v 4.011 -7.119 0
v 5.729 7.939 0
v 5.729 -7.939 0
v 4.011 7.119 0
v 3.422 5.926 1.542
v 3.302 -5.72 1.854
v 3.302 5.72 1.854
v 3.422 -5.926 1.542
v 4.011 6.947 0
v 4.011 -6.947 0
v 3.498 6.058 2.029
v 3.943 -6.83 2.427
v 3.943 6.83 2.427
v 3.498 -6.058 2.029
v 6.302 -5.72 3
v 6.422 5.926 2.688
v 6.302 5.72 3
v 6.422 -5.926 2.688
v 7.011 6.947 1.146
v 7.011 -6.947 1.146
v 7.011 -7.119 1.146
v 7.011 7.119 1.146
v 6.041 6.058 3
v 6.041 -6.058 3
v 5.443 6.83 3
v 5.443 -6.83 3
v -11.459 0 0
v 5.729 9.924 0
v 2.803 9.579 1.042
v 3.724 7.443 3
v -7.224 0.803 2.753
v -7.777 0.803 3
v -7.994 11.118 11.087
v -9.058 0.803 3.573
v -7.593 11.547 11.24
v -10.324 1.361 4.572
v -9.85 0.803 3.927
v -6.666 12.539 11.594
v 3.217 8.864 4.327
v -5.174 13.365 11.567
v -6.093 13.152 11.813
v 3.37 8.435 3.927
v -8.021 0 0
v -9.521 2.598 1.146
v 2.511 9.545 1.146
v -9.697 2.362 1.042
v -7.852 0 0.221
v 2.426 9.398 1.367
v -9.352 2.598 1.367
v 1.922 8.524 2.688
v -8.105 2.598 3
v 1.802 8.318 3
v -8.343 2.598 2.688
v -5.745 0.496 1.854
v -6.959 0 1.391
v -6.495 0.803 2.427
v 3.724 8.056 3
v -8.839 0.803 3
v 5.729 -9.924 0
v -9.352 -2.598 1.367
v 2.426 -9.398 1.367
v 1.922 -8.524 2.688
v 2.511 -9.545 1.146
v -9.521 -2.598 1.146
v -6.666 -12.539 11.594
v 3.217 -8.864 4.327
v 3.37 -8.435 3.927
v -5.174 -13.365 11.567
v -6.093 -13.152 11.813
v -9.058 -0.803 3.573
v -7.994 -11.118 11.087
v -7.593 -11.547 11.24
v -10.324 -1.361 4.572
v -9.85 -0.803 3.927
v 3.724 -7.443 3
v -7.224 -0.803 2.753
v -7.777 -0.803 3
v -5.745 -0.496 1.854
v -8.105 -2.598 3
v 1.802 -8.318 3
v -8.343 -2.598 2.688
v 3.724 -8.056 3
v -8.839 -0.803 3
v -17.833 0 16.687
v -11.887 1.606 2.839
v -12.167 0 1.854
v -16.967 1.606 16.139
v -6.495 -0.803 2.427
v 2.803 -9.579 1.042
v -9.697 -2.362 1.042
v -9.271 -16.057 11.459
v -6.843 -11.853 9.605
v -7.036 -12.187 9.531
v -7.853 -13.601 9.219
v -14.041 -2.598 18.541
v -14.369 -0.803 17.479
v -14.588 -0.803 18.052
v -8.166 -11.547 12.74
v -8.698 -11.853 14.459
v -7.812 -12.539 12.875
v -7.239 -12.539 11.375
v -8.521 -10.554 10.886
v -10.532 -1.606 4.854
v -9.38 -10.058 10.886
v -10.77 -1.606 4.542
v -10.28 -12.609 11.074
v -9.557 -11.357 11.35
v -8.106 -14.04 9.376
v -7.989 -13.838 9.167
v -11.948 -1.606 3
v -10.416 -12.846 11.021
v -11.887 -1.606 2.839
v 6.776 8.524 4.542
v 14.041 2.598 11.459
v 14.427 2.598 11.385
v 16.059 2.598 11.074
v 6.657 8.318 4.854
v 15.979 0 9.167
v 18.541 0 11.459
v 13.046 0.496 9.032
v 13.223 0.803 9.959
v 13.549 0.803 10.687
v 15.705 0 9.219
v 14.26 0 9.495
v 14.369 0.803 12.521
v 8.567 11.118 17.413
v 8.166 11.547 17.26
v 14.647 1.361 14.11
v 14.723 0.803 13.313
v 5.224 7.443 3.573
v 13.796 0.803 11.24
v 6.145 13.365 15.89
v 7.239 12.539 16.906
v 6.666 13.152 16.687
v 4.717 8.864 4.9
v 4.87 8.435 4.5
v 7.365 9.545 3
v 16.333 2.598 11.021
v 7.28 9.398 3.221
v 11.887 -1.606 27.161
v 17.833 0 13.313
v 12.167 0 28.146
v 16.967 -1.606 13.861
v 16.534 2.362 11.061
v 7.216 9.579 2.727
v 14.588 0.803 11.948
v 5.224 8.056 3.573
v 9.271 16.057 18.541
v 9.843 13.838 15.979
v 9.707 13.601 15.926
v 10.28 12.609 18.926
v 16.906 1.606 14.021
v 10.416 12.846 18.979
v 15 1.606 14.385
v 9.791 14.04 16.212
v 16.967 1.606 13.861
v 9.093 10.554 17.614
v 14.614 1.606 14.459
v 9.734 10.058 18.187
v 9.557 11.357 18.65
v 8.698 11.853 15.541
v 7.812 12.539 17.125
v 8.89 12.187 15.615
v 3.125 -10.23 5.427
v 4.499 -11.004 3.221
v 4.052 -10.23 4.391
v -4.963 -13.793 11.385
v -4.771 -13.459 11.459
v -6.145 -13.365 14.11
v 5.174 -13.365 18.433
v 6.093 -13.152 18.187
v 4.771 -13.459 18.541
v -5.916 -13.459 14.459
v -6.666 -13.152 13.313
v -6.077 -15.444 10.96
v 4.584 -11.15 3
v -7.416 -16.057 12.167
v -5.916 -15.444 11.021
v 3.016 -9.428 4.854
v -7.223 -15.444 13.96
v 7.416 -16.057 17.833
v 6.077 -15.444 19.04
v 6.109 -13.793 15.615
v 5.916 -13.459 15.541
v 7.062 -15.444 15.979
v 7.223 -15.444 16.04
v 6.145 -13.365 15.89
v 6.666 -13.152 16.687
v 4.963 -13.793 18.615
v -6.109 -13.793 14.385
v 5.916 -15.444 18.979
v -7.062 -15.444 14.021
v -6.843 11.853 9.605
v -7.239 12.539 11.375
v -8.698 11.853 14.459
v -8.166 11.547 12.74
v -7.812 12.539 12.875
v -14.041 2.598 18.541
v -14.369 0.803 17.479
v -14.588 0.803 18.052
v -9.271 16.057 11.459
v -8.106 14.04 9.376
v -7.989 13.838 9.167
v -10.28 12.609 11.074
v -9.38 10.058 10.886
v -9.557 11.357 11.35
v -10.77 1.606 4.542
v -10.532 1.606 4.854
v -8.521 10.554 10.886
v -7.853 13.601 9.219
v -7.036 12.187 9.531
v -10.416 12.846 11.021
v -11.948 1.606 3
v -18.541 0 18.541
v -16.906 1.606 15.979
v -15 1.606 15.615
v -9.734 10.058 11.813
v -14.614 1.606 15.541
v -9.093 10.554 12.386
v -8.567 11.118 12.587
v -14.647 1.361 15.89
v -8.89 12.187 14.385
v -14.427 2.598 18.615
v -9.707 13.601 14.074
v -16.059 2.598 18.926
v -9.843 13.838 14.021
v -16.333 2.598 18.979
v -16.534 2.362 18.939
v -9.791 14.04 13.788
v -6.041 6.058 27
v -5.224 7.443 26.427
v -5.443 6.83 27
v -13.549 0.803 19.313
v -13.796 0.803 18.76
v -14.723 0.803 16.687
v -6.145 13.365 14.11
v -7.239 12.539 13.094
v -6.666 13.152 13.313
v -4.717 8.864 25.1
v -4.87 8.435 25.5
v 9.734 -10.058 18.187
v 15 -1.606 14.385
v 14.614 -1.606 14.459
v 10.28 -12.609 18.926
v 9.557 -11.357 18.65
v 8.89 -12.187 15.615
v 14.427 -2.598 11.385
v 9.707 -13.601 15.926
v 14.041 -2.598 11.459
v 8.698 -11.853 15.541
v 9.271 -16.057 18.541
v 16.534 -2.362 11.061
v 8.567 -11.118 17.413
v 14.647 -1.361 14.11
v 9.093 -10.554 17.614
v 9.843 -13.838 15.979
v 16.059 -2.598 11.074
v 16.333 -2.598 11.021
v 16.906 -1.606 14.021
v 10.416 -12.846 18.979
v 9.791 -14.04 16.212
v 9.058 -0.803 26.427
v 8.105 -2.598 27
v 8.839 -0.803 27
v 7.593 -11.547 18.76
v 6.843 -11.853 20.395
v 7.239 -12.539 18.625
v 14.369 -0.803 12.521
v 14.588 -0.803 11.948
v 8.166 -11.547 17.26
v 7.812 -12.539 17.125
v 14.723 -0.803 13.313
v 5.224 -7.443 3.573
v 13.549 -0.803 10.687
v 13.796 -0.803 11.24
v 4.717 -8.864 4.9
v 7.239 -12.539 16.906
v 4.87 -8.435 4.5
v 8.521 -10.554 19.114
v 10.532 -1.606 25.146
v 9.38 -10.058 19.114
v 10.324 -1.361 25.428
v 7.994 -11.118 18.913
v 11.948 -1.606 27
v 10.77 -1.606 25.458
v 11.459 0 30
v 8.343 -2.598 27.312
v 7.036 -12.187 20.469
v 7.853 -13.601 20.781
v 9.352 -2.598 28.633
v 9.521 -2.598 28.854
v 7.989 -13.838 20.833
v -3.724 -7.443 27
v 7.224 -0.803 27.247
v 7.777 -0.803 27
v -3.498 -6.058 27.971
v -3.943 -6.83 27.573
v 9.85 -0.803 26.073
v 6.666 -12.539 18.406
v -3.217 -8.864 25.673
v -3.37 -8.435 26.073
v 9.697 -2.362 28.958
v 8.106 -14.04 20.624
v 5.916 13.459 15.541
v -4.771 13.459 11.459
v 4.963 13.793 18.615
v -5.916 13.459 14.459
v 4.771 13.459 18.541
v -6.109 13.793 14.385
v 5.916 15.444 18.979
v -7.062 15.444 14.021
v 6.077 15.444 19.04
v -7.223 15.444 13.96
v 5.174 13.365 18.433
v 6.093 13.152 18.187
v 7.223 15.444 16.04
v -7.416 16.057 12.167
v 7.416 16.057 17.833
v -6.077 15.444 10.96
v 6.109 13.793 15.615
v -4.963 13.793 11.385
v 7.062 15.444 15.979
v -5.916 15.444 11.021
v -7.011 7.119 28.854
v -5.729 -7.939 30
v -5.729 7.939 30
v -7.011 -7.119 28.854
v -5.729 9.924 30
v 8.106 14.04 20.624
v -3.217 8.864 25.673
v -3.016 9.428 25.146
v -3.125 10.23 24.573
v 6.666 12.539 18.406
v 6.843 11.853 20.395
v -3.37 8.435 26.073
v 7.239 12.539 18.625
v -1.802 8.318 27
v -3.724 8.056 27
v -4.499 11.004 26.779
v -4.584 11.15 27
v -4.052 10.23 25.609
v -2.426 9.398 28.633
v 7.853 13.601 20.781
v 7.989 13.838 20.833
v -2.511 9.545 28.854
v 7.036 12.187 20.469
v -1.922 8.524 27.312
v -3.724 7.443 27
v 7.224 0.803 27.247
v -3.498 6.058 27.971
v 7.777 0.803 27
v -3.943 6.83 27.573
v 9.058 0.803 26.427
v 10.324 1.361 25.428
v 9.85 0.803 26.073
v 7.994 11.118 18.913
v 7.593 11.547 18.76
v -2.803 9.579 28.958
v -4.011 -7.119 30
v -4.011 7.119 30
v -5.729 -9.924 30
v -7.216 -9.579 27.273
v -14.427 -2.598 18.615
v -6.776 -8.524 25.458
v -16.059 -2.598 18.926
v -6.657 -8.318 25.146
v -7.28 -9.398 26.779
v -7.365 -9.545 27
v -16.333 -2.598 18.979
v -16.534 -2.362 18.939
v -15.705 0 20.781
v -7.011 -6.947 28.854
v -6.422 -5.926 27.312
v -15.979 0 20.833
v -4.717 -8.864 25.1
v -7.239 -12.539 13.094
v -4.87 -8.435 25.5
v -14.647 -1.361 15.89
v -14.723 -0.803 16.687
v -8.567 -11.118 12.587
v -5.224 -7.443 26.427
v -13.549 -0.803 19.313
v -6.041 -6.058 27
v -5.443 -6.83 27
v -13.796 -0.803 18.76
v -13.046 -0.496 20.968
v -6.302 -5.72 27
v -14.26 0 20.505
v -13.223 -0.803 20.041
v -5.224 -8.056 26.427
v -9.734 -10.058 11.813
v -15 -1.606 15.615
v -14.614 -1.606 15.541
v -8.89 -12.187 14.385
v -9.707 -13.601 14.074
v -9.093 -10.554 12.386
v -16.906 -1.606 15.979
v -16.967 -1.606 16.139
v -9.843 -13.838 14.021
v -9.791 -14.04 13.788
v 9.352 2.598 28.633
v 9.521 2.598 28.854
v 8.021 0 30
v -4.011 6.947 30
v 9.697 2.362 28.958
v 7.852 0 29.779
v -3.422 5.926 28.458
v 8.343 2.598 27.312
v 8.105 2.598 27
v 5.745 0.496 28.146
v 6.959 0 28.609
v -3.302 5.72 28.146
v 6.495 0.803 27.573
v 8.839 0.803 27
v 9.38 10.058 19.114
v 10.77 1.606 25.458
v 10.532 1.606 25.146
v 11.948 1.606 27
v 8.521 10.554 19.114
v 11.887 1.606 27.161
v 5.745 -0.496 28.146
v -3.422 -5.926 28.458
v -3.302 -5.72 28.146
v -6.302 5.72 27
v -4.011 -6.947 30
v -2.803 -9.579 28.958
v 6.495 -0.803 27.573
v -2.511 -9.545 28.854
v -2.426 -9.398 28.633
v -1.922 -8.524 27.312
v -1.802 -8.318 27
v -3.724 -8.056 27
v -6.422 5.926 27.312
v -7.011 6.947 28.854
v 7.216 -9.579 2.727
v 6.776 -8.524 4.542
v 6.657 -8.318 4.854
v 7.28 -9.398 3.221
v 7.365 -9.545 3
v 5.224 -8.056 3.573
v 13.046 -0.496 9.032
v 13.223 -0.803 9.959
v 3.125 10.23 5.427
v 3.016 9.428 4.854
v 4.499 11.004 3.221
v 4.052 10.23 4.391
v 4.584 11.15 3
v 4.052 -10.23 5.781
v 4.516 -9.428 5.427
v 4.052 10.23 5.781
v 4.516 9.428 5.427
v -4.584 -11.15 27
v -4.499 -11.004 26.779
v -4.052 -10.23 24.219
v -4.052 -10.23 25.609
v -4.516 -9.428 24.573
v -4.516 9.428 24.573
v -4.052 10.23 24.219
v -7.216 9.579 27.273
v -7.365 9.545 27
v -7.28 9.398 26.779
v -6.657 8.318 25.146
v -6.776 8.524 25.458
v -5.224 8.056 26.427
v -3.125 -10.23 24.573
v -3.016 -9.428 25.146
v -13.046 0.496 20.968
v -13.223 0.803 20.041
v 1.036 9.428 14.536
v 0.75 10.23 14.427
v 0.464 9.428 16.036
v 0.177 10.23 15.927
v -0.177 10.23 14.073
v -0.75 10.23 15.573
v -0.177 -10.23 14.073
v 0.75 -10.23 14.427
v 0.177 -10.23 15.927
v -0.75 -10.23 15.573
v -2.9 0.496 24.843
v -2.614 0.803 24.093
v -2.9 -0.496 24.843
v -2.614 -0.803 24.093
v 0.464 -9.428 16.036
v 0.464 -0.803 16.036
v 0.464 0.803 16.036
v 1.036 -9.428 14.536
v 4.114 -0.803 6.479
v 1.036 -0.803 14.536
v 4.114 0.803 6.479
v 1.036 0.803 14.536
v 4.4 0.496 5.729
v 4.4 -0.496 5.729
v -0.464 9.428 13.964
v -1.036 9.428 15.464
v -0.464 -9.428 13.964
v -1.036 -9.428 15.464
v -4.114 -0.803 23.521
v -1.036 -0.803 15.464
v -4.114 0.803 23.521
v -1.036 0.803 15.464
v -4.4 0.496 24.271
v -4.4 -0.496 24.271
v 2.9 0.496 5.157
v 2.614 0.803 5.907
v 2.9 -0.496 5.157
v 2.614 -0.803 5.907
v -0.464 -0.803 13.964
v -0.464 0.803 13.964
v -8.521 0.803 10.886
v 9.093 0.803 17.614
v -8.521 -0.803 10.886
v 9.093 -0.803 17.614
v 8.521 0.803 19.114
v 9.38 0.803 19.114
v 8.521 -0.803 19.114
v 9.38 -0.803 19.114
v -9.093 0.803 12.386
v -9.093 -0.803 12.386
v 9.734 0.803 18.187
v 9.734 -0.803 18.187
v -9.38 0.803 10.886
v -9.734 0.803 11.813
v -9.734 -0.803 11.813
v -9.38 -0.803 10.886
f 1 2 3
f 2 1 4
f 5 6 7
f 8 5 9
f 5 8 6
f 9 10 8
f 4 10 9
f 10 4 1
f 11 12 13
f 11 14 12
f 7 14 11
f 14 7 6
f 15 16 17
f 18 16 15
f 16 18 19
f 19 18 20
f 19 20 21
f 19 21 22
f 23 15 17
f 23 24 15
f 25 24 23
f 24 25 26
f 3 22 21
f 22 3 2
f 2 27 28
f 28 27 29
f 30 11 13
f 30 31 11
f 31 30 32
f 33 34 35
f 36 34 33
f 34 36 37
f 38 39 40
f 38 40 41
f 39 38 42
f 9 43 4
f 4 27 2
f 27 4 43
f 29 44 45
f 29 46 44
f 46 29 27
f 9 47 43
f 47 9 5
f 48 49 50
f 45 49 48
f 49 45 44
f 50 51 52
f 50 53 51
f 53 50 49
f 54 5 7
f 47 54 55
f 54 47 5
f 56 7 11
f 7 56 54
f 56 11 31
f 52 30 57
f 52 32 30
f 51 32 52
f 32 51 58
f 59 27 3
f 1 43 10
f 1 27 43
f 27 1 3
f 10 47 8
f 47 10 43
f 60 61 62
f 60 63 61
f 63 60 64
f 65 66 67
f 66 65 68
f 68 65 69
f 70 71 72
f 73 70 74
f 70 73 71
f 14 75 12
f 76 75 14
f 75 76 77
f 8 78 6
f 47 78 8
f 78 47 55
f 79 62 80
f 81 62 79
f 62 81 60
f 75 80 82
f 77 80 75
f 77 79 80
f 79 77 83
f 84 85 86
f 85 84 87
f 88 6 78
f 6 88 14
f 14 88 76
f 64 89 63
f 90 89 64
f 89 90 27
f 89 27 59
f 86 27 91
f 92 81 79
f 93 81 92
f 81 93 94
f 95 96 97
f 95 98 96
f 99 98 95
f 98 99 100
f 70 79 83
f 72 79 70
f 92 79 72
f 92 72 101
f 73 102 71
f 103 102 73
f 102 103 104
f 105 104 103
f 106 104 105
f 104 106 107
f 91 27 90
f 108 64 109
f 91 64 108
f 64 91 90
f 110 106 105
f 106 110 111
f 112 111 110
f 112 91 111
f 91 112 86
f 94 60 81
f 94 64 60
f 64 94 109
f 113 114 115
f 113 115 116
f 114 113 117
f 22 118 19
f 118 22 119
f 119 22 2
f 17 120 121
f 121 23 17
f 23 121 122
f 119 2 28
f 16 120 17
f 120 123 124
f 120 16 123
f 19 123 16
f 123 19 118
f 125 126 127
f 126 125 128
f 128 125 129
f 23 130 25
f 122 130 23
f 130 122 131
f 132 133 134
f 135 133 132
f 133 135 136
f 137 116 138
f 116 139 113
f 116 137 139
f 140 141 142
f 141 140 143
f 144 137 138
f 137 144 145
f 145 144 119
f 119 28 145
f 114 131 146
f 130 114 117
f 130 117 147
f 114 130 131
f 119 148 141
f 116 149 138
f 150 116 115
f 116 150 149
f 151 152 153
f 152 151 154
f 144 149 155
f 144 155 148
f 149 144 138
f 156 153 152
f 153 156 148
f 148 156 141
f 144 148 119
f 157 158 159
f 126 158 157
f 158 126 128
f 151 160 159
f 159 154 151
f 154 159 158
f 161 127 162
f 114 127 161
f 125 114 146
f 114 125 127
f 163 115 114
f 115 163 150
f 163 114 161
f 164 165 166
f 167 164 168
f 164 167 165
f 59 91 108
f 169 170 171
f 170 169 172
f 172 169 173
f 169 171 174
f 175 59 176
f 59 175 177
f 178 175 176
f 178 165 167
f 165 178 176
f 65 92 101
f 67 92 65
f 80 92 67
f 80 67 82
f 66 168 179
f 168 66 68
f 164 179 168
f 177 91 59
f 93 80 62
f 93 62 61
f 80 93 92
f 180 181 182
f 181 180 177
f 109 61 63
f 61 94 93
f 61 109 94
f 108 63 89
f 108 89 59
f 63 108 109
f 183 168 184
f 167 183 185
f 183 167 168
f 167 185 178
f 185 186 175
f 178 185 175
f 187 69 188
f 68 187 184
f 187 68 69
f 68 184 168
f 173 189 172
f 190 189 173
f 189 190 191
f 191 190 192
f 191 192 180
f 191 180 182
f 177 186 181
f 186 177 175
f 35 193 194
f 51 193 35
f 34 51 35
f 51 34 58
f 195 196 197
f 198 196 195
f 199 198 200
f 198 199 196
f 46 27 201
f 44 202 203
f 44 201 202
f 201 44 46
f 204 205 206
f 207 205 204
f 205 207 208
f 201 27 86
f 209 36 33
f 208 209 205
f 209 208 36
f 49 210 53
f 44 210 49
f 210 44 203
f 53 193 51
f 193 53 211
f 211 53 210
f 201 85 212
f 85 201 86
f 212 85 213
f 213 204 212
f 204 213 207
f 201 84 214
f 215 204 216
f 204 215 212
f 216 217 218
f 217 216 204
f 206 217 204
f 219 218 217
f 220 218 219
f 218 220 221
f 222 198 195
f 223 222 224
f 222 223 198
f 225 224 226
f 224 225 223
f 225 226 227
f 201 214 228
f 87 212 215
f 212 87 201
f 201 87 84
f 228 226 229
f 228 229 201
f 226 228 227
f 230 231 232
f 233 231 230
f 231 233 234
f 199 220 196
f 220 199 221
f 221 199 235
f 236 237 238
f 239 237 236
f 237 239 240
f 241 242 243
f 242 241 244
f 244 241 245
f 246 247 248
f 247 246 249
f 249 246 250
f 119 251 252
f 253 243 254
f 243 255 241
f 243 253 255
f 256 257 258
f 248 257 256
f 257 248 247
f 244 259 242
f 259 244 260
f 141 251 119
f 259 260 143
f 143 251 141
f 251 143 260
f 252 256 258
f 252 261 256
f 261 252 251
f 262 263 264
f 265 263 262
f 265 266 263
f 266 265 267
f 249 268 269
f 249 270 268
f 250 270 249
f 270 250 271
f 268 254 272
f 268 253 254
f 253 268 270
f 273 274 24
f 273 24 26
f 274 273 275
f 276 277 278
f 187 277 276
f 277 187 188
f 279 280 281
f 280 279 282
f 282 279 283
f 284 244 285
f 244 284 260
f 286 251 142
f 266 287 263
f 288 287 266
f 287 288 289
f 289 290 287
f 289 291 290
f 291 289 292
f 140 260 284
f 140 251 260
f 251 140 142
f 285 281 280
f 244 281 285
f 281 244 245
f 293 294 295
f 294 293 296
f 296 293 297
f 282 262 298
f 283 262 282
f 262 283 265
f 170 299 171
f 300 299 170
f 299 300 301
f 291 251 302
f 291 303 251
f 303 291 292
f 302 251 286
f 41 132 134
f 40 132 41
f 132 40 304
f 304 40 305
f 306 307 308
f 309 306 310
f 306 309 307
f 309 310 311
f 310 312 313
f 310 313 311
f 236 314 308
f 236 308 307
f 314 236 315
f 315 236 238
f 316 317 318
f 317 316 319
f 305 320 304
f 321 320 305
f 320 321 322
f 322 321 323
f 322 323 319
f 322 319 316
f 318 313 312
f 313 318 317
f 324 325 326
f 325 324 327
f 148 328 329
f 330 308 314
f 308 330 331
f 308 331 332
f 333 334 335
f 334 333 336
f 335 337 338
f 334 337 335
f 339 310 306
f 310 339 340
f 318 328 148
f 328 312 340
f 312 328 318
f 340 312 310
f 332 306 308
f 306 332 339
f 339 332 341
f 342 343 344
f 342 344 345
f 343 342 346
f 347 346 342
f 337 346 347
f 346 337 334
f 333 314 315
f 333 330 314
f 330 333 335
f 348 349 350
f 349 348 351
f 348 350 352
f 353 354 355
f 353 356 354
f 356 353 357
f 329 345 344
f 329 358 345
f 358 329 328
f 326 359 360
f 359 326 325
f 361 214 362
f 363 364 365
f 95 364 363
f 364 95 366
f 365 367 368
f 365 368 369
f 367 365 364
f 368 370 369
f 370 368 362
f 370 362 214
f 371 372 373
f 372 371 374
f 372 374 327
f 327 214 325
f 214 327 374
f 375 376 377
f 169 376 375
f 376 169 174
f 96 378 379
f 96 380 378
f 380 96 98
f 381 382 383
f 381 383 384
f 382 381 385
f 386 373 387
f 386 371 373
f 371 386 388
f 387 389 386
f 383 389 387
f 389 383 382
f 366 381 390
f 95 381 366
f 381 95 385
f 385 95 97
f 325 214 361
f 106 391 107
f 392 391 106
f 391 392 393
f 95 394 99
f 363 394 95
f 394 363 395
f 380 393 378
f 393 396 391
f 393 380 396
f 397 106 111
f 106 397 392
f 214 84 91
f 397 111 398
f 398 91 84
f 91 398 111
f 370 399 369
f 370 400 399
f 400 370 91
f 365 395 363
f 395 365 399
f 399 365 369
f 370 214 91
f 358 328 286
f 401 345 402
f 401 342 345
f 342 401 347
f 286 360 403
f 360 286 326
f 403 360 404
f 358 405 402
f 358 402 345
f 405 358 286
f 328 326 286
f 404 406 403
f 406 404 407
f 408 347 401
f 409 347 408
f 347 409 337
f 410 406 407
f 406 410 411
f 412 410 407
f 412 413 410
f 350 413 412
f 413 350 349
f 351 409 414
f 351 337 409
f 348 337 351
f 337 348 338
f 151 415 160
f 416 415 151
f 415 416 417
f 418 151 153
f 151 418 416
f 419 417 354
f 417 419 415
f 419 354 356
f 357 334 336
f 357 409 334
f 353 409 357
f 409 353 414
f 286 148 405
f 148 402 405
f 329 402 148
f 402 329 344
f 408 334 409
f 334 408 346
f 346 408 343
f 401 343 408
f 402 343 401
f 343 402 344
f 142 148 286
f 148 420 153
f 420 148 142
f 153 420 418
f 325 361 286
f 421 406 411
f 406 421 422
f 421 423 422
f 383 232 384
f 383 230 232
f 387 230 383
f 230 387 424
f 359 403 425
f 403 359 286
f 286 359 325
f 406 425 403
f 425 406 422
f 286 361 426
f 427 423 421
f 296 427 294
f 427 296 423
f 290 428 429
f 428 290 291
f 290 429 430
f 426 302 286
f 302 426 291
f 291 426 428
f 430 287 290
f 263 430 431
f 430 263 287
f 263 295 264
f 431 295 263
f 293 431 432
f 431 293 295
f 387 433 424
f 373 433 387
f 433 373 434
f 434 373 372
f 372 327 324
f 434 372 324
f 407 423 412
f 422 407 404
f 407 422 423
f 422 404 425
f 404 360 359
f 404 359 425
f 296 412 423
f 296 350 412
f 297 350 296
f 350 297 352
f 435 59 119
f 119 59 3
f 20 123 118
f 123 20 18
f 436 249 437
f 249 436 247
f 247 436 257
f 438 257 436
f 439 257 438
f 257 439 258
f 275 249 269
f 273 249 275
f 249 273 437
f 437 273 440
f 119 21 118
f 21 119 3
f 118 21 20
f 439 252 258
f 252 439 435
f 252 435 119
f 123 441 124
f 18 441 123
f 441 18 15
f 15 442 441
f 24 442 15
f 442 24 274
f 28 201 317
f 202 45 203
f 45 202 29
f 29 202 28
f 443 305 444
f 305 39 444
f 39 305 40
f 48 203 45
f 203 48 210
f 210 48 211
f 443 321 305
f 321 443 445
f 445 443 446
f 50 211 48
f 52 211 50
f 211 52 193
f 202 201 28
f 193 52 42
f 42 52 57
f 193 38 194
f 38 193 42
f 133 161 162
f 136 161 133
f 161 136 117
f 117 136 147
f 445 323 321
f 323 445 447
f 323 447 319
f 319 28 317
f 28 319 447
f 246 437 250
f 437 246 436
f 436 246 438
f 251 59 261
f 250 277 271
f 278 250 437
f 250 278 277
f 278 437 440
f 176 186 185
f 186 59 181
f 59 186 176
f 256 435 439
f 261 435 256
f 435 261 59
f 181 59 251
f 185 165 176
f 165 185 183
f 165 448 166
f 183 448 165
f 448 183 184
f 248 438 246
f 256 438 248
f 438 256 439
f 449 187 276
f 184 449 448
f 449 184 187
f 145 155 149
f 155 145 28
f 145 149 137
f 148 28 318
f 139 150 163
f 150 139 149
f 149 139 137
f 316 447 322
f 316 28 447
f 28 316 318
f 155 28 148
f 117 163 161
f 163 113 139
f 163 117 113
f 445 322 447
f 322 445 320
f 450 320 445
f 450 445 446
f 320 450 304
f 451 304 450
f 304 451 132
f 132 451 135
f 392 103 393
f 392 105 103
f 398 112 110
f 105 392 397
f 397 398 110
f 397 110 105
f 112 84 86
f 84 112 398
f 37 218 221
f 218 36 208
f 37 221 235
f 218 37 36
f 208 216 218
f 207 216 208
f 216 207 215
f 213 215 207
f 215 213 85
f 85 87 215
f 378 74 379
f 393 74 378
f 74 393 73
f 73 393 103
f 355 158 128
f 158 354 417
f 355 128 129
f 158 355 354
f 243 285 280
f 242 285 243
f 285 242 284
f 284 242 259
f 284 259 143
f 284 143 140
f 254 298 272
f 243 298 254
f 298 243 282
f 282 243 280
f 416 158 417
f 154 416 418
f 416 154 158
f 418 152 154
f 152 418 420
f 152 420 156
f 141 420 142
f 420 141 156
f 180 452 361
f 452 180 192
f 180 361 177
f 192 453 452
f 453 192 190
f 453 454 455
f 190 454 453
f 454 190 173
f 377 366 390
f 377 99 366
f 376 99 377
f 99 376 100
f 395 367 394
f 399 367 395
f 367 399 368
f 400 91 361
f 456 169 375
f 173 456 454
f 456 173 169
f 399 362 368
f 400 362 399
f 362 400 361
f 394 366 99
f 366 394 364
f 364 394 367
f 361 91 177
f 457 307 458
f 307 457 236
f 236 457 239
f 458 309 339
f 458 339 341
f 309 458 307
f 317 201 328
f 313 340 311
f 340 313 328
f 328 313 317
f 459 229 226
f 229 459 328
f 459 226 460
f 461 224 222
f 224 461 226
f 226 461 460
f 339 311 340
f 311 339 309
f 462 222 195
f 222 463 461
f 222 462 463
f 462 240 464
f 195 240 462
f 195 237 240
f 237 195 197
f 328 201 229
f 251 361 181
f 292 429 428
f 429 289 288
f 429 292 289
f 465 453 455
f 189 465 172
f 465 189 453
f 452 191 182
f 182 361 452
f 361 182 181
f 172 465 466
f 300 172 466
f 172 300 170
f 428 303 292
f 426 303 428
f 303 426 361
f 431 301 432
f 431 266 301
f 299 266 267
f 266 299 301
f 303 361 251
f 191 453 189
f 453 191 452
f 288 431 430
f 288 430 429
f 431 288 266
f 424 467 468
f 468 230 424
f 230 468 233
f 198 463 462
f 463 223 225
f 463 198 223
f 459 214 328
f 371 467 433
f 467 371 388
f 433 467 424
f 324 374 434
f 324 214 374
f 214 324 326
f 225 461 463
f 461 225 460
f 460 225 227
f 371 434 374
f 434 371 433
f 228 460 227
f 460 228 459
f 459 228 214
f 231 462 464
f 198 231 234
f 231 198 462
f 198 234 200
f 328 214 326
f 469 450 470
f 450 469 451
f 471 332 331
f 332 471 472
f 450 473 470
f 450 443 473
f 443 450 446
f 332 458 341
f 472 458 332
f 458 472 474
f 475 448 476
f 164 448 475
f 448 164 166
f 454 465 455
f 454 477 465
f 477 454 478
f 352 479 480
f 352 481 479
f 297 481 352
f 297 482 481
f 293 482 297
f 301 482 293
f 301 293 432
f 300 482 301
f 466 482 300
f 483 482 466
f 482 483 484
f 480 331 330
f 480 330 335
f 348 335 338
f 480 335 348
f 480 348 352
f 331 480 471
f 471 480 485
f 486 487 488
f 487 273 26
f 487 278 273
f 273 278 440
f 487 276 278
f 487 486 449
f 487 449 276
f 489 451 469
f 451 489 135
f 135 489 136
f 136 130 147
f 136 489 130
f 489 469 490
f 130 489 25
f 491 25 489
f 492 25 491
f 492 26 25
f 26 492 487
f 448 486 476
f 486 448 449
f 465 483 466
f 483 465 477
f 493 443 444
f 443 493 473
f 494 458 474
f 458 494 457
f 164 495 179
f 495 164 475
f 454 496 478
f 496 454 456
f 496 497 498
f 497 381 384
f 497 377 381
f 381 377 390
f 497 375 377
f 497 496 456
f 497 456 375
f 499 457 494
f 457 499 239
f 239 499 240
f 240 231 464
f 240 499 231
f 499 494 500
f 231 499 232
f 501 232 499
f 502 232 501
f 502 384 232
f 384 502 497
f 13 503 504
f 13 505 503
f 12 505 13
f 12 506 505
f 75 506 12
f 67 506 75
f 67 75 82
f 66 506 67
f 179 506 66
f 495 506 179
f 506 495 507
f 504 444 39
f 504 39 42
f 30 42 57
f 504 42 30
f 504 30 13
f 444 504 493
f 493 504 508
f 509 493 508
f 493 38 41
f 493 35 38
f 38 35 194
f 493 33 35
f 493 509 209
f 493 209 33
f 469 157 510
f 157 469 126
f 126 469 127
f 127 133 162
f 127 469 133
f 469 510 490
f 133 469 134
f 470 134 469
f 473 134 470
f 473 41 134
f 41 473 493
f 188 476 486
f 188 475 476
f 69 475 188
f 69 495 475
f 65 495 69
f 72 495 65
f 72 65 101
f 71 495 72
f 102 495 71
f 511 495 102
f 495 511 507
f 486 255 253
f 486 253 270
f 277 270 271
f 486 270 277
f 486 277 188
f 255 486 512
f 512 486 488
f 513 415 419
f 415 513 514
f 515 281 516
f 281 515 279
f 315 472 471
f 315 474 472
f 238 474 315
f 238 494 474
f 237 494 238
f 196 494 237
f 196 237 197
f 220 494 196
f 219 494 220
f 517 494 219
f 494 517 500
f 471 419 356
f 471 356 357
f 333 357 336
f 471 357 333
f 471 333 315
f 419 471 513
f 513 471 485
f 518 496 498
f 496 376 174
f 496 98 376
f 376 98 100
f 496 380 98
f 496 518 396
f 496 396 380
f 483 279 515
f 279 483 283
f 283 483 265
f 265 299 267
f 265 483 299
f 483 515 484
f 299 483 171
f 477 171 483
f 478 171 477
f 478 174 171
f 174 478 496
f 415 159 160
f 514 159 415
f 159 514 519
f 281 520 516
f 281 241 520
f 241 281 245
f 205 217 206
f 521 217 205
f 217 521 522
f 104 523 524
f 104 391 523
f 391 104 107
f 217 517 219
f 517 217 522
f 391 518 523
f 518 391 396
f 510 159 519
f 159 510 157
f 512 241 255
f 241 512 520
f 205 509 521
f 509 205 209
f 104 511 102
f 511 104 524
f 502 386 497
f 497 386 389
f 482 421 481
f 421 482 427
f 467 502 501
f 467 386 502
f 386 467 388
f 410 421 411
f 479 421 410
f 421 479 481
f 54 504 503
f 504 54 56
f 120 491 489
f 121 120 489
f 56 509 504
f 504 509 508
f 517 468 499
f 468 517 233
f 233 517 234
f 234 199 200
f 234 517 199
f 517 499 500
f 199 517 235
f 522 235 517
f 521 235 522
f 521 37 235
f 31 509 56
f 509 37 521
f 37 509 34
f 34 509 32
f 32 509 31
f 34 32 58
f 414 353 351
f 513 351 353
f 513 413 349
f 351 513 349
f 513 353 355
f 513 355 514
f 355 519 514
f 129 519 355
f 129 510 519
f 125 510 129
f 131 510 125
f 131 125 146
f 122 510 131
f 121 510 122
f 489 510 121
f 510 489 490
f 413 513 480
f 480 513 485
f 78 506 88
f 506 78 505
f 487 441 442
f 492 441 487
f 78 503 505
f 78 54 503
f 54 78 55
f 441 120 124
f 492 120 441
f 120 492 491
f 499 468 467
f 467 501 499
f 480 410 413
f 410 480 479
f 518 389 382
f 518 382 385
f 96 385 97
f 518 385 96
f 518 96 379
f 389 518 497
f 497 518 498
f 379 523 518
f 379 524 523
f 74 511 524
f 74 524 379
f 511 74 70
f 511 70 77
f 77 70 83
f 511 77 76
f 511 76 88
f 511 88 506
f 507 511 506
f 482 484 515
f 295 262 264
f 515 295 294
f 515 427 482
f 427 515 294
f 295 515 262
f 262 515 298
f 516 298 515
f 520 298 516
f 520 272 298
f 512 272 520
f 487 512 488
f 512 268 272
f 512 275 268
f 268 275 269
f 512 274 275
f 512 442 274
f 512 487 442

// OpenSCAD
// shape height
sh = 30;
// plane width
pw = 1.5;
// wire width
bw = 3;

include <polyhedra.scad>;

translate([0, 0, sh / 2]) 
    face_rotate(icosahedron) 
        icosahedron2();

ivert = icosahedron[0];
iface = icosahedron[1];

ifr = face_dist(icosahedron);

module icosahedron0p() {
    poly_fill0(icosahedron, pw);
}

module icosahedron2() {
    ps = (sh - pw) / 2 / ifr;    
    module h4(a, b, c, d) {
        hull() {
            translate(ivert[a] * ps) icosahedron0p();
            translate(ivert[b] * ps) icosahedron0p();
            translate(ivert[c] * ps) icosahedron0p();
            translate(ivert[d] * ps) icosahedron0p();
        }
    }
    h4(0, 1, 10, 11);
    h4(4, 5, 6, 7);
    h4(2, 3, 8, 9);
    poly_wire0(icosahedron);
}
